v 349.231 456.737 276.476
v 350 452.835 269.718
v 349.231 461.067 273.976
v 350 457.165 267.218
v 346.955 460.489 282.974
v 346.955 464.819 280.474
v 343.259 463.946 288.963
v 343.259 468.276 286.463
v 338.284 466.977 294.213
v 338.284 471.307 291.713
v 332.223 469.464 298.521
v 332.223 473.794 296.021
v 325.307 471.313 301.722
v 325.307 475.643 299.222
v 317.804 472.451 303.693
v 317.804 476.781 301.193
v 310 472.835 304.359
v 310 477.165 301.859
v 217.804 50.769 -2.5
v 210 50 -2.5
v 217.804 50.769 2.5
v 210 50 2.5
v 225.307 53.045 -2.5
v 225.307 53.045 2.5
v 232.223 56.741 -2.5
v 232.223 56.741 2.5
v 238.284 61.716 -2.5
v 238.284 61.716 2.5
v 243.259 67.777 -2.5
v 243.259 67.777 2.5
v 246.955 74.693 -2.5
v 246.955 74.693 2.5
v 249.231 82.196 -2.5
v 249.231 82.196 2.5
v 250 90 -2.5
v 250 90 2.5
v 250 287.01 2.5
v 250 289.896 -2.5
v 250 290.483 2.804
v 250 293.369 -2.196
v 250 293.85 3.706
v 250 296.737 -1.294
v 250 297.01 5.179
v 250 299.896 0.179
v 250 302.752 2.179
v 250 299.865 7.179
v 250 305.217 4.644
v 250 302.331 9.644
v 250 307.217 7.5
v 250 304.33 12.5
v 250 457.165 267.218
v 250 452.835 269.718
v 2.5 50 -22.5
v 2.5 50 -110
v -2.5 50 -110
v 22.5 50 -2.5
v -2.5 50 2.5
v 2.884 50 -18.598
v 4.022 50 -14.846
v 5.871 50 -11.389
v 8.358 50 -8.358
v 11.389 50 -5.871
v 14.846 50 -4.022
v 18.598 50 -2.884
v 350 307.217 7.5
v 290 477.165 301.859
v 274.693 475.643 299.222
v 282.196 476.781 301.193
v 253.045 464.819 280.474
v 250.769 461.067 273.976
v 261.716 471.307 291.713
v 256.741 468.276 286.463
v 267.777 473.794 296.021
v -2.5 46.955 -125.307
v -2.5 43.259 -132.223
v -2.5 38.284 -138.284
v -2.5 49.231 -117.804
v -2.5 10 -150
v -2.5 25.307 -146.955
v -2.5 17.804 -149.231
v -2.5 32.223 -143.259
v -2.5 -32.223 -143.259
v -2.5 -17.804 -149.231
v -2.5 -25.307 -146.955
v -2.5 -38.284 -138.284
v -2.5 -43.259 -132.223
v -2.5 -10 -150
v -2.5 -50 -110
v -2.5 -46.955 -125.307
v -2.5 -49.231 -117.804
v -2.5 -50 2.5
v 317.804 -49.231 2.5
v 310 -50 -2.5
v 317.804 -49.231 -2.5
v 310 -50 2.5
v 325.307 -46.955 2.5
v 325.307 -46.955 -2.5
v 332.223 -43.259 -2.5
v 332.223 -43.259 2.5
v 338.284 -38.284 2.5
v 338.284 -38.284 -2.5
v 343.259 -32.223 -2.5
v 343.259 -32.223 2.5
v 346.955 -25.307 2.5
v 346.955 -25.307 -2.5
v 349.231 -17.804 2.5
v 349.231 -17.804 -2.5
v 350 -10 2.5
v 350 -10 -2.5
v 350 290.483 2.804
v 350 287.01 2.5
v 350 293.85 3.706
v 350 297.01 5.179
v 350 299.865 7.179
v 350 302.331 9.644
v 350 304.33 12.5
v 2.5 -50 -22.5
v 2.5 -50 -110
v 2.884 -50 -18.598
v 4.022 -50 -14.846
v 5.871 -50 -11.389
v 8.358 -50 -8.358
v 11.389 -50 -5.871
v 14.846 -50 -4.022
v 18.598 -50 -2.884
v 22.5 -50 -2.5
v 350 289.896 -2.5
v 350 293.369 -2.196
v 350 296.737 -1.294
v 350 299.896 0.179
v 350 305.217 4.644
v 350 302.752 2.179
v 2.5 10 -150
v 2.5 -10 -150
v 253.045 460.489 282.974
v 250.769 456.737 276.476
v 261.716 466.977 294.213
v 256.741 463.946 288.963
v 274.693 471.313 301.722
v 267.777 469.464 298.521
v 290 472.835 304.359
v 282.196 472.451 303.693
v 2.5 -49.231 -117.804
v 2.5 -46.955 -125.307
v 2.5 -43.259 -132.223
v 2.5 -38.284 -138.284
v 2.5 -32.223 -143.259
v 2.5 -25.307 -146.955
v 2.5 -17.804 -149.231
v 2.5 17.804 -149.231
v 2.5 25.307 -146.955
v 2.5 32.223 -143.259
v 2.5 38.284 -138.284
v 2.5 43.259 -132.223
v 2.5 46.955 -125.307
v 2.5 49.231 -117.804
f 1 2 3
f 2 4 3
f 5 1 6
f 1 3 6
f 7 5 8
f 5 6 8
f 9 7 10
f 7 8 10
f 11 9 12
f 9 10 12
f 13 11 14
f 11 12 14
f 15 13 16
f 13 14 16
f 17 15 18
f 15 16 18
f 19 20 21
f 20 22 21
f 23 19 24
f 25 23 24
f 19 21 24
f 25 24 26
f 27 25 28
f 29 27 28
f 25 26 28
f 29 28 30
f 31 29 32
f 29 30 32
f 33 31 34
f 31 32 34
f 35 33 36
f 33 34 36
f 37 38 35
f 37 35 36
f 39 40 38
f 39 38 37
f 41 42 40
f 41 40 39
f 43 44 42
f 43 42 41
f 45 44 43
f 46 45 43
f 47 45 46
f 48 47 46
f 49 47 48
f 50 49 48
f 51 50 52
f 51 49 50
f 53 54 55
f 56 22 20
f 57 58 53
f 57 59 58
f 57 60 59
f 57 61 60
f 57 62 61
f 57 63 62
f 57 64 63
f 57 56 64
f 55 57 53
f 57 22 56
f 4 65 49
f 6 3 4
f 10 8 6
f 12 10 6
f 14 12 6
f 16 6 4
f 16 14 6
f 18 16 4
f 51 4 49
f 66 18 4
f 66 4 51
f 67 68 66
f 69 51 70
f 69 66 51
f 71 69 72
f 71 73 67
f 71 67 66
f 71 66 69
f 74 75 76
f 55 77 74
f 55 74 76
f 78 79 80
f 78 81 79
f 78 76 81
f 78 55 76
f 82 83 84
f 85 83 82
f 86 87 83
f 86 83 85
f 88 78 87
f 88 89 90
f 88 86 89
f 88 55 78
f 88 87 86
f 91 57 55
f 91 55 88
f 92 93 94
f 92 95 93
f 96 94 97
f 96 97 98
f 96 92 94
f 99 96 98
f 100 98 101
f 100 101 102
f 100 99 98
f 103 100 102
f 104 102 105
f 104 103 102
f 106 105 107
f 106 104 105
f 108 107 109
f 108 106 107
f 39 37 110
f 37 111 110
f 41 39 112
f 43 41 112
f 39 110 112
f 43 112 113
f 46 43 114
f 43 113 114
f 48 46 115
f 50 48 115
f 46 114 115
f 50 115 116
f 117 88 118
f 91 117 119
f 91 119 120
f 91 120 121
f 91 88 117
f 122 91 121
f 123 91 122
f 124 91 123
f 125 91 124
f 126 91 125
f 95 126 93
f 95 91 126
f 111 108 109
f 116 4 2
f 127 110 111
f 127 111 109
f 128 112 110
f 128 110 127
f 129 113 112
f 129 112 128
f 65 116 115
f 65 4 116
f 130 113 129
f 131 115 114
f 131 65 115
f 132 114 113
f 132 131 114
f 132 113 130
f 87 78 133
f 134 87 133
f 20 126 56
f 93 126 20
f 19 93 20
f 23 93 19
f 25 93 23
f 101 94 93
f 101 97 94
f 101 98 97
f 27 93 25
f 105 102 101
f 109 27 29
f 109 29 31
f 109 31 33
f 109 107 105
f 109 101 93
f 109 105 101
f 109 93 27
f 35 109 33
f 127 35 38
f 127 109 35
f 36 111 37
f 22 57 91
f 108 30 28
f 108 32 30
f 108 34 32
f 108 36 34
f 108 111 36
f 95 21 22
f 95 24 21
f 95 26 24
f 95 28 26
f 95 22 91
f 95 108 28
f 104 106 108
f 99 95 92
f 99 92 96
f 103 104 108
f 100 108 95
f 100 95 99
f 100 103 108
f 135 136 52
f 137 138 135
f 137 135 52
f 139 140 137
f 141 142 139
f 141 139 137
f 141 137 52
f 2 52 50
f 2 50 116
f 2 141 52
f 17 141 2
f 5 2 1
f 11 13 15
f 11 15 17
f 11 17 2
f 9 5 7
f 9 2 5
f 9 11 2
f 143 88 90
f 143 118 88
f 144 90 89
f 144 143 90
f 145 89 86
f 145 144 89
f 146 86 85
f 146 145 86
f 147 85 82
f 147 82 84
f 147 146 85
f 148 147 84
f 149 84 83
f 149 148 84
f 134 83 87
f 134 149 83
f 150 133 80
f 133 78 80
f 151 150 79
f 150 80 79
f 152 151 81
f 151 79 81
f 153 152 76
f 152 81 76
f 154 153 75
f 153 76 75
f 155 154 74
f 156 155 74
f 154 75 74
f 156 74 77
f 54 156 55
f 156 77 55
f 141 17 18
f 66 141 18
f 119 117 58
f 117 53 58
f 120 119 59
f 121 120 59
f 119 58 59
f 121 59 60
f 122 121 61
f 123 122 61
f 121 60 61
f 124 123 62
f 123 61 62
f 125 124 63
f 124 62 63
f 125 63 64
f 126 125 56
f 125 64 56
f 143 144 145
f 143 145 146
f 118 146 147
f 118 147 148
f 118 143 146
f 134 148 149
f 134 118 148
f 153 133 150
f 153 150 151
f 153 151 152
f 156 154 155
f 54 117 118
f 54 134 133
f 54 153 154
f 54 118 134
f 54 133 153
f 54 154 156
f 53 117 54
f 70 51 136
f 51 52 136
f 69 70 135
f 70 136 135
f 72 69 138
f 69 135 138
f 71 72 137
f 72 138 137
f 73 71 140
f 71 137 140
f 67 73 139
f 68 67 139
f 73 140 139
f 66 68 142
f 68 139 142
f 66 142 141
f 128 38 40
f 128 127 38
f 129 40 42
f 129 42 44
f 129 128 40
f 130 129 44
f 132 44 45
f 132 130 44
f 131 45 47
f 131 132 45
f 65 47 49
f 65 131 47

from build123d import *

# Parameters (mm, degrees)
F4_W = 5
F4_H = 100
F6_R = 20
F7_R = 40


with BuildPart() as f5:
    # F5: sweep along a path in F0, F2
    with BuildLine(Plane.XZ) as f5_path:
        Line((0, -150), (0, 0))
        Line((0, 0), (300, 0))
    with BuildLine(Plane.YZ.offset(300)) as f5_path_2:
        Line((0, 0), (300, 0))
        Line((300, 0), (475, 303.1088913246))
    # F4 (on plane+point) → F5 (sweep)
    with BuildSketch(Plane.XY.offset(-150)):
        Rectangle(F4_W, F4_H)
    sweep(path=f5_path.line + f5_path_2.line, transition=Transition.RIGHT)

    # F6
    f6_edges = [f5.edges().sort_by_distance(p)[0] for p in [
        (2.5, 0, -2.5),
        (300, 298.556624, 2.5),
        (300, 301.443376, -2.5),
    ]]
    fillet(f6_edges, radius=F6_R)

    # F7
    f7_edges = [f5.edges().sort_by_distance(p)[0] for p in [
        (350, -50, 0),
        (250, 50, 0),
        (350, 475, 303.108891),
        (250, 475, 303.108891),
        (0, -50, -150),
        (0, 50, -150),
    ]]
    fillet(f7_edges, radius=F7_R)


solid = f5.part
